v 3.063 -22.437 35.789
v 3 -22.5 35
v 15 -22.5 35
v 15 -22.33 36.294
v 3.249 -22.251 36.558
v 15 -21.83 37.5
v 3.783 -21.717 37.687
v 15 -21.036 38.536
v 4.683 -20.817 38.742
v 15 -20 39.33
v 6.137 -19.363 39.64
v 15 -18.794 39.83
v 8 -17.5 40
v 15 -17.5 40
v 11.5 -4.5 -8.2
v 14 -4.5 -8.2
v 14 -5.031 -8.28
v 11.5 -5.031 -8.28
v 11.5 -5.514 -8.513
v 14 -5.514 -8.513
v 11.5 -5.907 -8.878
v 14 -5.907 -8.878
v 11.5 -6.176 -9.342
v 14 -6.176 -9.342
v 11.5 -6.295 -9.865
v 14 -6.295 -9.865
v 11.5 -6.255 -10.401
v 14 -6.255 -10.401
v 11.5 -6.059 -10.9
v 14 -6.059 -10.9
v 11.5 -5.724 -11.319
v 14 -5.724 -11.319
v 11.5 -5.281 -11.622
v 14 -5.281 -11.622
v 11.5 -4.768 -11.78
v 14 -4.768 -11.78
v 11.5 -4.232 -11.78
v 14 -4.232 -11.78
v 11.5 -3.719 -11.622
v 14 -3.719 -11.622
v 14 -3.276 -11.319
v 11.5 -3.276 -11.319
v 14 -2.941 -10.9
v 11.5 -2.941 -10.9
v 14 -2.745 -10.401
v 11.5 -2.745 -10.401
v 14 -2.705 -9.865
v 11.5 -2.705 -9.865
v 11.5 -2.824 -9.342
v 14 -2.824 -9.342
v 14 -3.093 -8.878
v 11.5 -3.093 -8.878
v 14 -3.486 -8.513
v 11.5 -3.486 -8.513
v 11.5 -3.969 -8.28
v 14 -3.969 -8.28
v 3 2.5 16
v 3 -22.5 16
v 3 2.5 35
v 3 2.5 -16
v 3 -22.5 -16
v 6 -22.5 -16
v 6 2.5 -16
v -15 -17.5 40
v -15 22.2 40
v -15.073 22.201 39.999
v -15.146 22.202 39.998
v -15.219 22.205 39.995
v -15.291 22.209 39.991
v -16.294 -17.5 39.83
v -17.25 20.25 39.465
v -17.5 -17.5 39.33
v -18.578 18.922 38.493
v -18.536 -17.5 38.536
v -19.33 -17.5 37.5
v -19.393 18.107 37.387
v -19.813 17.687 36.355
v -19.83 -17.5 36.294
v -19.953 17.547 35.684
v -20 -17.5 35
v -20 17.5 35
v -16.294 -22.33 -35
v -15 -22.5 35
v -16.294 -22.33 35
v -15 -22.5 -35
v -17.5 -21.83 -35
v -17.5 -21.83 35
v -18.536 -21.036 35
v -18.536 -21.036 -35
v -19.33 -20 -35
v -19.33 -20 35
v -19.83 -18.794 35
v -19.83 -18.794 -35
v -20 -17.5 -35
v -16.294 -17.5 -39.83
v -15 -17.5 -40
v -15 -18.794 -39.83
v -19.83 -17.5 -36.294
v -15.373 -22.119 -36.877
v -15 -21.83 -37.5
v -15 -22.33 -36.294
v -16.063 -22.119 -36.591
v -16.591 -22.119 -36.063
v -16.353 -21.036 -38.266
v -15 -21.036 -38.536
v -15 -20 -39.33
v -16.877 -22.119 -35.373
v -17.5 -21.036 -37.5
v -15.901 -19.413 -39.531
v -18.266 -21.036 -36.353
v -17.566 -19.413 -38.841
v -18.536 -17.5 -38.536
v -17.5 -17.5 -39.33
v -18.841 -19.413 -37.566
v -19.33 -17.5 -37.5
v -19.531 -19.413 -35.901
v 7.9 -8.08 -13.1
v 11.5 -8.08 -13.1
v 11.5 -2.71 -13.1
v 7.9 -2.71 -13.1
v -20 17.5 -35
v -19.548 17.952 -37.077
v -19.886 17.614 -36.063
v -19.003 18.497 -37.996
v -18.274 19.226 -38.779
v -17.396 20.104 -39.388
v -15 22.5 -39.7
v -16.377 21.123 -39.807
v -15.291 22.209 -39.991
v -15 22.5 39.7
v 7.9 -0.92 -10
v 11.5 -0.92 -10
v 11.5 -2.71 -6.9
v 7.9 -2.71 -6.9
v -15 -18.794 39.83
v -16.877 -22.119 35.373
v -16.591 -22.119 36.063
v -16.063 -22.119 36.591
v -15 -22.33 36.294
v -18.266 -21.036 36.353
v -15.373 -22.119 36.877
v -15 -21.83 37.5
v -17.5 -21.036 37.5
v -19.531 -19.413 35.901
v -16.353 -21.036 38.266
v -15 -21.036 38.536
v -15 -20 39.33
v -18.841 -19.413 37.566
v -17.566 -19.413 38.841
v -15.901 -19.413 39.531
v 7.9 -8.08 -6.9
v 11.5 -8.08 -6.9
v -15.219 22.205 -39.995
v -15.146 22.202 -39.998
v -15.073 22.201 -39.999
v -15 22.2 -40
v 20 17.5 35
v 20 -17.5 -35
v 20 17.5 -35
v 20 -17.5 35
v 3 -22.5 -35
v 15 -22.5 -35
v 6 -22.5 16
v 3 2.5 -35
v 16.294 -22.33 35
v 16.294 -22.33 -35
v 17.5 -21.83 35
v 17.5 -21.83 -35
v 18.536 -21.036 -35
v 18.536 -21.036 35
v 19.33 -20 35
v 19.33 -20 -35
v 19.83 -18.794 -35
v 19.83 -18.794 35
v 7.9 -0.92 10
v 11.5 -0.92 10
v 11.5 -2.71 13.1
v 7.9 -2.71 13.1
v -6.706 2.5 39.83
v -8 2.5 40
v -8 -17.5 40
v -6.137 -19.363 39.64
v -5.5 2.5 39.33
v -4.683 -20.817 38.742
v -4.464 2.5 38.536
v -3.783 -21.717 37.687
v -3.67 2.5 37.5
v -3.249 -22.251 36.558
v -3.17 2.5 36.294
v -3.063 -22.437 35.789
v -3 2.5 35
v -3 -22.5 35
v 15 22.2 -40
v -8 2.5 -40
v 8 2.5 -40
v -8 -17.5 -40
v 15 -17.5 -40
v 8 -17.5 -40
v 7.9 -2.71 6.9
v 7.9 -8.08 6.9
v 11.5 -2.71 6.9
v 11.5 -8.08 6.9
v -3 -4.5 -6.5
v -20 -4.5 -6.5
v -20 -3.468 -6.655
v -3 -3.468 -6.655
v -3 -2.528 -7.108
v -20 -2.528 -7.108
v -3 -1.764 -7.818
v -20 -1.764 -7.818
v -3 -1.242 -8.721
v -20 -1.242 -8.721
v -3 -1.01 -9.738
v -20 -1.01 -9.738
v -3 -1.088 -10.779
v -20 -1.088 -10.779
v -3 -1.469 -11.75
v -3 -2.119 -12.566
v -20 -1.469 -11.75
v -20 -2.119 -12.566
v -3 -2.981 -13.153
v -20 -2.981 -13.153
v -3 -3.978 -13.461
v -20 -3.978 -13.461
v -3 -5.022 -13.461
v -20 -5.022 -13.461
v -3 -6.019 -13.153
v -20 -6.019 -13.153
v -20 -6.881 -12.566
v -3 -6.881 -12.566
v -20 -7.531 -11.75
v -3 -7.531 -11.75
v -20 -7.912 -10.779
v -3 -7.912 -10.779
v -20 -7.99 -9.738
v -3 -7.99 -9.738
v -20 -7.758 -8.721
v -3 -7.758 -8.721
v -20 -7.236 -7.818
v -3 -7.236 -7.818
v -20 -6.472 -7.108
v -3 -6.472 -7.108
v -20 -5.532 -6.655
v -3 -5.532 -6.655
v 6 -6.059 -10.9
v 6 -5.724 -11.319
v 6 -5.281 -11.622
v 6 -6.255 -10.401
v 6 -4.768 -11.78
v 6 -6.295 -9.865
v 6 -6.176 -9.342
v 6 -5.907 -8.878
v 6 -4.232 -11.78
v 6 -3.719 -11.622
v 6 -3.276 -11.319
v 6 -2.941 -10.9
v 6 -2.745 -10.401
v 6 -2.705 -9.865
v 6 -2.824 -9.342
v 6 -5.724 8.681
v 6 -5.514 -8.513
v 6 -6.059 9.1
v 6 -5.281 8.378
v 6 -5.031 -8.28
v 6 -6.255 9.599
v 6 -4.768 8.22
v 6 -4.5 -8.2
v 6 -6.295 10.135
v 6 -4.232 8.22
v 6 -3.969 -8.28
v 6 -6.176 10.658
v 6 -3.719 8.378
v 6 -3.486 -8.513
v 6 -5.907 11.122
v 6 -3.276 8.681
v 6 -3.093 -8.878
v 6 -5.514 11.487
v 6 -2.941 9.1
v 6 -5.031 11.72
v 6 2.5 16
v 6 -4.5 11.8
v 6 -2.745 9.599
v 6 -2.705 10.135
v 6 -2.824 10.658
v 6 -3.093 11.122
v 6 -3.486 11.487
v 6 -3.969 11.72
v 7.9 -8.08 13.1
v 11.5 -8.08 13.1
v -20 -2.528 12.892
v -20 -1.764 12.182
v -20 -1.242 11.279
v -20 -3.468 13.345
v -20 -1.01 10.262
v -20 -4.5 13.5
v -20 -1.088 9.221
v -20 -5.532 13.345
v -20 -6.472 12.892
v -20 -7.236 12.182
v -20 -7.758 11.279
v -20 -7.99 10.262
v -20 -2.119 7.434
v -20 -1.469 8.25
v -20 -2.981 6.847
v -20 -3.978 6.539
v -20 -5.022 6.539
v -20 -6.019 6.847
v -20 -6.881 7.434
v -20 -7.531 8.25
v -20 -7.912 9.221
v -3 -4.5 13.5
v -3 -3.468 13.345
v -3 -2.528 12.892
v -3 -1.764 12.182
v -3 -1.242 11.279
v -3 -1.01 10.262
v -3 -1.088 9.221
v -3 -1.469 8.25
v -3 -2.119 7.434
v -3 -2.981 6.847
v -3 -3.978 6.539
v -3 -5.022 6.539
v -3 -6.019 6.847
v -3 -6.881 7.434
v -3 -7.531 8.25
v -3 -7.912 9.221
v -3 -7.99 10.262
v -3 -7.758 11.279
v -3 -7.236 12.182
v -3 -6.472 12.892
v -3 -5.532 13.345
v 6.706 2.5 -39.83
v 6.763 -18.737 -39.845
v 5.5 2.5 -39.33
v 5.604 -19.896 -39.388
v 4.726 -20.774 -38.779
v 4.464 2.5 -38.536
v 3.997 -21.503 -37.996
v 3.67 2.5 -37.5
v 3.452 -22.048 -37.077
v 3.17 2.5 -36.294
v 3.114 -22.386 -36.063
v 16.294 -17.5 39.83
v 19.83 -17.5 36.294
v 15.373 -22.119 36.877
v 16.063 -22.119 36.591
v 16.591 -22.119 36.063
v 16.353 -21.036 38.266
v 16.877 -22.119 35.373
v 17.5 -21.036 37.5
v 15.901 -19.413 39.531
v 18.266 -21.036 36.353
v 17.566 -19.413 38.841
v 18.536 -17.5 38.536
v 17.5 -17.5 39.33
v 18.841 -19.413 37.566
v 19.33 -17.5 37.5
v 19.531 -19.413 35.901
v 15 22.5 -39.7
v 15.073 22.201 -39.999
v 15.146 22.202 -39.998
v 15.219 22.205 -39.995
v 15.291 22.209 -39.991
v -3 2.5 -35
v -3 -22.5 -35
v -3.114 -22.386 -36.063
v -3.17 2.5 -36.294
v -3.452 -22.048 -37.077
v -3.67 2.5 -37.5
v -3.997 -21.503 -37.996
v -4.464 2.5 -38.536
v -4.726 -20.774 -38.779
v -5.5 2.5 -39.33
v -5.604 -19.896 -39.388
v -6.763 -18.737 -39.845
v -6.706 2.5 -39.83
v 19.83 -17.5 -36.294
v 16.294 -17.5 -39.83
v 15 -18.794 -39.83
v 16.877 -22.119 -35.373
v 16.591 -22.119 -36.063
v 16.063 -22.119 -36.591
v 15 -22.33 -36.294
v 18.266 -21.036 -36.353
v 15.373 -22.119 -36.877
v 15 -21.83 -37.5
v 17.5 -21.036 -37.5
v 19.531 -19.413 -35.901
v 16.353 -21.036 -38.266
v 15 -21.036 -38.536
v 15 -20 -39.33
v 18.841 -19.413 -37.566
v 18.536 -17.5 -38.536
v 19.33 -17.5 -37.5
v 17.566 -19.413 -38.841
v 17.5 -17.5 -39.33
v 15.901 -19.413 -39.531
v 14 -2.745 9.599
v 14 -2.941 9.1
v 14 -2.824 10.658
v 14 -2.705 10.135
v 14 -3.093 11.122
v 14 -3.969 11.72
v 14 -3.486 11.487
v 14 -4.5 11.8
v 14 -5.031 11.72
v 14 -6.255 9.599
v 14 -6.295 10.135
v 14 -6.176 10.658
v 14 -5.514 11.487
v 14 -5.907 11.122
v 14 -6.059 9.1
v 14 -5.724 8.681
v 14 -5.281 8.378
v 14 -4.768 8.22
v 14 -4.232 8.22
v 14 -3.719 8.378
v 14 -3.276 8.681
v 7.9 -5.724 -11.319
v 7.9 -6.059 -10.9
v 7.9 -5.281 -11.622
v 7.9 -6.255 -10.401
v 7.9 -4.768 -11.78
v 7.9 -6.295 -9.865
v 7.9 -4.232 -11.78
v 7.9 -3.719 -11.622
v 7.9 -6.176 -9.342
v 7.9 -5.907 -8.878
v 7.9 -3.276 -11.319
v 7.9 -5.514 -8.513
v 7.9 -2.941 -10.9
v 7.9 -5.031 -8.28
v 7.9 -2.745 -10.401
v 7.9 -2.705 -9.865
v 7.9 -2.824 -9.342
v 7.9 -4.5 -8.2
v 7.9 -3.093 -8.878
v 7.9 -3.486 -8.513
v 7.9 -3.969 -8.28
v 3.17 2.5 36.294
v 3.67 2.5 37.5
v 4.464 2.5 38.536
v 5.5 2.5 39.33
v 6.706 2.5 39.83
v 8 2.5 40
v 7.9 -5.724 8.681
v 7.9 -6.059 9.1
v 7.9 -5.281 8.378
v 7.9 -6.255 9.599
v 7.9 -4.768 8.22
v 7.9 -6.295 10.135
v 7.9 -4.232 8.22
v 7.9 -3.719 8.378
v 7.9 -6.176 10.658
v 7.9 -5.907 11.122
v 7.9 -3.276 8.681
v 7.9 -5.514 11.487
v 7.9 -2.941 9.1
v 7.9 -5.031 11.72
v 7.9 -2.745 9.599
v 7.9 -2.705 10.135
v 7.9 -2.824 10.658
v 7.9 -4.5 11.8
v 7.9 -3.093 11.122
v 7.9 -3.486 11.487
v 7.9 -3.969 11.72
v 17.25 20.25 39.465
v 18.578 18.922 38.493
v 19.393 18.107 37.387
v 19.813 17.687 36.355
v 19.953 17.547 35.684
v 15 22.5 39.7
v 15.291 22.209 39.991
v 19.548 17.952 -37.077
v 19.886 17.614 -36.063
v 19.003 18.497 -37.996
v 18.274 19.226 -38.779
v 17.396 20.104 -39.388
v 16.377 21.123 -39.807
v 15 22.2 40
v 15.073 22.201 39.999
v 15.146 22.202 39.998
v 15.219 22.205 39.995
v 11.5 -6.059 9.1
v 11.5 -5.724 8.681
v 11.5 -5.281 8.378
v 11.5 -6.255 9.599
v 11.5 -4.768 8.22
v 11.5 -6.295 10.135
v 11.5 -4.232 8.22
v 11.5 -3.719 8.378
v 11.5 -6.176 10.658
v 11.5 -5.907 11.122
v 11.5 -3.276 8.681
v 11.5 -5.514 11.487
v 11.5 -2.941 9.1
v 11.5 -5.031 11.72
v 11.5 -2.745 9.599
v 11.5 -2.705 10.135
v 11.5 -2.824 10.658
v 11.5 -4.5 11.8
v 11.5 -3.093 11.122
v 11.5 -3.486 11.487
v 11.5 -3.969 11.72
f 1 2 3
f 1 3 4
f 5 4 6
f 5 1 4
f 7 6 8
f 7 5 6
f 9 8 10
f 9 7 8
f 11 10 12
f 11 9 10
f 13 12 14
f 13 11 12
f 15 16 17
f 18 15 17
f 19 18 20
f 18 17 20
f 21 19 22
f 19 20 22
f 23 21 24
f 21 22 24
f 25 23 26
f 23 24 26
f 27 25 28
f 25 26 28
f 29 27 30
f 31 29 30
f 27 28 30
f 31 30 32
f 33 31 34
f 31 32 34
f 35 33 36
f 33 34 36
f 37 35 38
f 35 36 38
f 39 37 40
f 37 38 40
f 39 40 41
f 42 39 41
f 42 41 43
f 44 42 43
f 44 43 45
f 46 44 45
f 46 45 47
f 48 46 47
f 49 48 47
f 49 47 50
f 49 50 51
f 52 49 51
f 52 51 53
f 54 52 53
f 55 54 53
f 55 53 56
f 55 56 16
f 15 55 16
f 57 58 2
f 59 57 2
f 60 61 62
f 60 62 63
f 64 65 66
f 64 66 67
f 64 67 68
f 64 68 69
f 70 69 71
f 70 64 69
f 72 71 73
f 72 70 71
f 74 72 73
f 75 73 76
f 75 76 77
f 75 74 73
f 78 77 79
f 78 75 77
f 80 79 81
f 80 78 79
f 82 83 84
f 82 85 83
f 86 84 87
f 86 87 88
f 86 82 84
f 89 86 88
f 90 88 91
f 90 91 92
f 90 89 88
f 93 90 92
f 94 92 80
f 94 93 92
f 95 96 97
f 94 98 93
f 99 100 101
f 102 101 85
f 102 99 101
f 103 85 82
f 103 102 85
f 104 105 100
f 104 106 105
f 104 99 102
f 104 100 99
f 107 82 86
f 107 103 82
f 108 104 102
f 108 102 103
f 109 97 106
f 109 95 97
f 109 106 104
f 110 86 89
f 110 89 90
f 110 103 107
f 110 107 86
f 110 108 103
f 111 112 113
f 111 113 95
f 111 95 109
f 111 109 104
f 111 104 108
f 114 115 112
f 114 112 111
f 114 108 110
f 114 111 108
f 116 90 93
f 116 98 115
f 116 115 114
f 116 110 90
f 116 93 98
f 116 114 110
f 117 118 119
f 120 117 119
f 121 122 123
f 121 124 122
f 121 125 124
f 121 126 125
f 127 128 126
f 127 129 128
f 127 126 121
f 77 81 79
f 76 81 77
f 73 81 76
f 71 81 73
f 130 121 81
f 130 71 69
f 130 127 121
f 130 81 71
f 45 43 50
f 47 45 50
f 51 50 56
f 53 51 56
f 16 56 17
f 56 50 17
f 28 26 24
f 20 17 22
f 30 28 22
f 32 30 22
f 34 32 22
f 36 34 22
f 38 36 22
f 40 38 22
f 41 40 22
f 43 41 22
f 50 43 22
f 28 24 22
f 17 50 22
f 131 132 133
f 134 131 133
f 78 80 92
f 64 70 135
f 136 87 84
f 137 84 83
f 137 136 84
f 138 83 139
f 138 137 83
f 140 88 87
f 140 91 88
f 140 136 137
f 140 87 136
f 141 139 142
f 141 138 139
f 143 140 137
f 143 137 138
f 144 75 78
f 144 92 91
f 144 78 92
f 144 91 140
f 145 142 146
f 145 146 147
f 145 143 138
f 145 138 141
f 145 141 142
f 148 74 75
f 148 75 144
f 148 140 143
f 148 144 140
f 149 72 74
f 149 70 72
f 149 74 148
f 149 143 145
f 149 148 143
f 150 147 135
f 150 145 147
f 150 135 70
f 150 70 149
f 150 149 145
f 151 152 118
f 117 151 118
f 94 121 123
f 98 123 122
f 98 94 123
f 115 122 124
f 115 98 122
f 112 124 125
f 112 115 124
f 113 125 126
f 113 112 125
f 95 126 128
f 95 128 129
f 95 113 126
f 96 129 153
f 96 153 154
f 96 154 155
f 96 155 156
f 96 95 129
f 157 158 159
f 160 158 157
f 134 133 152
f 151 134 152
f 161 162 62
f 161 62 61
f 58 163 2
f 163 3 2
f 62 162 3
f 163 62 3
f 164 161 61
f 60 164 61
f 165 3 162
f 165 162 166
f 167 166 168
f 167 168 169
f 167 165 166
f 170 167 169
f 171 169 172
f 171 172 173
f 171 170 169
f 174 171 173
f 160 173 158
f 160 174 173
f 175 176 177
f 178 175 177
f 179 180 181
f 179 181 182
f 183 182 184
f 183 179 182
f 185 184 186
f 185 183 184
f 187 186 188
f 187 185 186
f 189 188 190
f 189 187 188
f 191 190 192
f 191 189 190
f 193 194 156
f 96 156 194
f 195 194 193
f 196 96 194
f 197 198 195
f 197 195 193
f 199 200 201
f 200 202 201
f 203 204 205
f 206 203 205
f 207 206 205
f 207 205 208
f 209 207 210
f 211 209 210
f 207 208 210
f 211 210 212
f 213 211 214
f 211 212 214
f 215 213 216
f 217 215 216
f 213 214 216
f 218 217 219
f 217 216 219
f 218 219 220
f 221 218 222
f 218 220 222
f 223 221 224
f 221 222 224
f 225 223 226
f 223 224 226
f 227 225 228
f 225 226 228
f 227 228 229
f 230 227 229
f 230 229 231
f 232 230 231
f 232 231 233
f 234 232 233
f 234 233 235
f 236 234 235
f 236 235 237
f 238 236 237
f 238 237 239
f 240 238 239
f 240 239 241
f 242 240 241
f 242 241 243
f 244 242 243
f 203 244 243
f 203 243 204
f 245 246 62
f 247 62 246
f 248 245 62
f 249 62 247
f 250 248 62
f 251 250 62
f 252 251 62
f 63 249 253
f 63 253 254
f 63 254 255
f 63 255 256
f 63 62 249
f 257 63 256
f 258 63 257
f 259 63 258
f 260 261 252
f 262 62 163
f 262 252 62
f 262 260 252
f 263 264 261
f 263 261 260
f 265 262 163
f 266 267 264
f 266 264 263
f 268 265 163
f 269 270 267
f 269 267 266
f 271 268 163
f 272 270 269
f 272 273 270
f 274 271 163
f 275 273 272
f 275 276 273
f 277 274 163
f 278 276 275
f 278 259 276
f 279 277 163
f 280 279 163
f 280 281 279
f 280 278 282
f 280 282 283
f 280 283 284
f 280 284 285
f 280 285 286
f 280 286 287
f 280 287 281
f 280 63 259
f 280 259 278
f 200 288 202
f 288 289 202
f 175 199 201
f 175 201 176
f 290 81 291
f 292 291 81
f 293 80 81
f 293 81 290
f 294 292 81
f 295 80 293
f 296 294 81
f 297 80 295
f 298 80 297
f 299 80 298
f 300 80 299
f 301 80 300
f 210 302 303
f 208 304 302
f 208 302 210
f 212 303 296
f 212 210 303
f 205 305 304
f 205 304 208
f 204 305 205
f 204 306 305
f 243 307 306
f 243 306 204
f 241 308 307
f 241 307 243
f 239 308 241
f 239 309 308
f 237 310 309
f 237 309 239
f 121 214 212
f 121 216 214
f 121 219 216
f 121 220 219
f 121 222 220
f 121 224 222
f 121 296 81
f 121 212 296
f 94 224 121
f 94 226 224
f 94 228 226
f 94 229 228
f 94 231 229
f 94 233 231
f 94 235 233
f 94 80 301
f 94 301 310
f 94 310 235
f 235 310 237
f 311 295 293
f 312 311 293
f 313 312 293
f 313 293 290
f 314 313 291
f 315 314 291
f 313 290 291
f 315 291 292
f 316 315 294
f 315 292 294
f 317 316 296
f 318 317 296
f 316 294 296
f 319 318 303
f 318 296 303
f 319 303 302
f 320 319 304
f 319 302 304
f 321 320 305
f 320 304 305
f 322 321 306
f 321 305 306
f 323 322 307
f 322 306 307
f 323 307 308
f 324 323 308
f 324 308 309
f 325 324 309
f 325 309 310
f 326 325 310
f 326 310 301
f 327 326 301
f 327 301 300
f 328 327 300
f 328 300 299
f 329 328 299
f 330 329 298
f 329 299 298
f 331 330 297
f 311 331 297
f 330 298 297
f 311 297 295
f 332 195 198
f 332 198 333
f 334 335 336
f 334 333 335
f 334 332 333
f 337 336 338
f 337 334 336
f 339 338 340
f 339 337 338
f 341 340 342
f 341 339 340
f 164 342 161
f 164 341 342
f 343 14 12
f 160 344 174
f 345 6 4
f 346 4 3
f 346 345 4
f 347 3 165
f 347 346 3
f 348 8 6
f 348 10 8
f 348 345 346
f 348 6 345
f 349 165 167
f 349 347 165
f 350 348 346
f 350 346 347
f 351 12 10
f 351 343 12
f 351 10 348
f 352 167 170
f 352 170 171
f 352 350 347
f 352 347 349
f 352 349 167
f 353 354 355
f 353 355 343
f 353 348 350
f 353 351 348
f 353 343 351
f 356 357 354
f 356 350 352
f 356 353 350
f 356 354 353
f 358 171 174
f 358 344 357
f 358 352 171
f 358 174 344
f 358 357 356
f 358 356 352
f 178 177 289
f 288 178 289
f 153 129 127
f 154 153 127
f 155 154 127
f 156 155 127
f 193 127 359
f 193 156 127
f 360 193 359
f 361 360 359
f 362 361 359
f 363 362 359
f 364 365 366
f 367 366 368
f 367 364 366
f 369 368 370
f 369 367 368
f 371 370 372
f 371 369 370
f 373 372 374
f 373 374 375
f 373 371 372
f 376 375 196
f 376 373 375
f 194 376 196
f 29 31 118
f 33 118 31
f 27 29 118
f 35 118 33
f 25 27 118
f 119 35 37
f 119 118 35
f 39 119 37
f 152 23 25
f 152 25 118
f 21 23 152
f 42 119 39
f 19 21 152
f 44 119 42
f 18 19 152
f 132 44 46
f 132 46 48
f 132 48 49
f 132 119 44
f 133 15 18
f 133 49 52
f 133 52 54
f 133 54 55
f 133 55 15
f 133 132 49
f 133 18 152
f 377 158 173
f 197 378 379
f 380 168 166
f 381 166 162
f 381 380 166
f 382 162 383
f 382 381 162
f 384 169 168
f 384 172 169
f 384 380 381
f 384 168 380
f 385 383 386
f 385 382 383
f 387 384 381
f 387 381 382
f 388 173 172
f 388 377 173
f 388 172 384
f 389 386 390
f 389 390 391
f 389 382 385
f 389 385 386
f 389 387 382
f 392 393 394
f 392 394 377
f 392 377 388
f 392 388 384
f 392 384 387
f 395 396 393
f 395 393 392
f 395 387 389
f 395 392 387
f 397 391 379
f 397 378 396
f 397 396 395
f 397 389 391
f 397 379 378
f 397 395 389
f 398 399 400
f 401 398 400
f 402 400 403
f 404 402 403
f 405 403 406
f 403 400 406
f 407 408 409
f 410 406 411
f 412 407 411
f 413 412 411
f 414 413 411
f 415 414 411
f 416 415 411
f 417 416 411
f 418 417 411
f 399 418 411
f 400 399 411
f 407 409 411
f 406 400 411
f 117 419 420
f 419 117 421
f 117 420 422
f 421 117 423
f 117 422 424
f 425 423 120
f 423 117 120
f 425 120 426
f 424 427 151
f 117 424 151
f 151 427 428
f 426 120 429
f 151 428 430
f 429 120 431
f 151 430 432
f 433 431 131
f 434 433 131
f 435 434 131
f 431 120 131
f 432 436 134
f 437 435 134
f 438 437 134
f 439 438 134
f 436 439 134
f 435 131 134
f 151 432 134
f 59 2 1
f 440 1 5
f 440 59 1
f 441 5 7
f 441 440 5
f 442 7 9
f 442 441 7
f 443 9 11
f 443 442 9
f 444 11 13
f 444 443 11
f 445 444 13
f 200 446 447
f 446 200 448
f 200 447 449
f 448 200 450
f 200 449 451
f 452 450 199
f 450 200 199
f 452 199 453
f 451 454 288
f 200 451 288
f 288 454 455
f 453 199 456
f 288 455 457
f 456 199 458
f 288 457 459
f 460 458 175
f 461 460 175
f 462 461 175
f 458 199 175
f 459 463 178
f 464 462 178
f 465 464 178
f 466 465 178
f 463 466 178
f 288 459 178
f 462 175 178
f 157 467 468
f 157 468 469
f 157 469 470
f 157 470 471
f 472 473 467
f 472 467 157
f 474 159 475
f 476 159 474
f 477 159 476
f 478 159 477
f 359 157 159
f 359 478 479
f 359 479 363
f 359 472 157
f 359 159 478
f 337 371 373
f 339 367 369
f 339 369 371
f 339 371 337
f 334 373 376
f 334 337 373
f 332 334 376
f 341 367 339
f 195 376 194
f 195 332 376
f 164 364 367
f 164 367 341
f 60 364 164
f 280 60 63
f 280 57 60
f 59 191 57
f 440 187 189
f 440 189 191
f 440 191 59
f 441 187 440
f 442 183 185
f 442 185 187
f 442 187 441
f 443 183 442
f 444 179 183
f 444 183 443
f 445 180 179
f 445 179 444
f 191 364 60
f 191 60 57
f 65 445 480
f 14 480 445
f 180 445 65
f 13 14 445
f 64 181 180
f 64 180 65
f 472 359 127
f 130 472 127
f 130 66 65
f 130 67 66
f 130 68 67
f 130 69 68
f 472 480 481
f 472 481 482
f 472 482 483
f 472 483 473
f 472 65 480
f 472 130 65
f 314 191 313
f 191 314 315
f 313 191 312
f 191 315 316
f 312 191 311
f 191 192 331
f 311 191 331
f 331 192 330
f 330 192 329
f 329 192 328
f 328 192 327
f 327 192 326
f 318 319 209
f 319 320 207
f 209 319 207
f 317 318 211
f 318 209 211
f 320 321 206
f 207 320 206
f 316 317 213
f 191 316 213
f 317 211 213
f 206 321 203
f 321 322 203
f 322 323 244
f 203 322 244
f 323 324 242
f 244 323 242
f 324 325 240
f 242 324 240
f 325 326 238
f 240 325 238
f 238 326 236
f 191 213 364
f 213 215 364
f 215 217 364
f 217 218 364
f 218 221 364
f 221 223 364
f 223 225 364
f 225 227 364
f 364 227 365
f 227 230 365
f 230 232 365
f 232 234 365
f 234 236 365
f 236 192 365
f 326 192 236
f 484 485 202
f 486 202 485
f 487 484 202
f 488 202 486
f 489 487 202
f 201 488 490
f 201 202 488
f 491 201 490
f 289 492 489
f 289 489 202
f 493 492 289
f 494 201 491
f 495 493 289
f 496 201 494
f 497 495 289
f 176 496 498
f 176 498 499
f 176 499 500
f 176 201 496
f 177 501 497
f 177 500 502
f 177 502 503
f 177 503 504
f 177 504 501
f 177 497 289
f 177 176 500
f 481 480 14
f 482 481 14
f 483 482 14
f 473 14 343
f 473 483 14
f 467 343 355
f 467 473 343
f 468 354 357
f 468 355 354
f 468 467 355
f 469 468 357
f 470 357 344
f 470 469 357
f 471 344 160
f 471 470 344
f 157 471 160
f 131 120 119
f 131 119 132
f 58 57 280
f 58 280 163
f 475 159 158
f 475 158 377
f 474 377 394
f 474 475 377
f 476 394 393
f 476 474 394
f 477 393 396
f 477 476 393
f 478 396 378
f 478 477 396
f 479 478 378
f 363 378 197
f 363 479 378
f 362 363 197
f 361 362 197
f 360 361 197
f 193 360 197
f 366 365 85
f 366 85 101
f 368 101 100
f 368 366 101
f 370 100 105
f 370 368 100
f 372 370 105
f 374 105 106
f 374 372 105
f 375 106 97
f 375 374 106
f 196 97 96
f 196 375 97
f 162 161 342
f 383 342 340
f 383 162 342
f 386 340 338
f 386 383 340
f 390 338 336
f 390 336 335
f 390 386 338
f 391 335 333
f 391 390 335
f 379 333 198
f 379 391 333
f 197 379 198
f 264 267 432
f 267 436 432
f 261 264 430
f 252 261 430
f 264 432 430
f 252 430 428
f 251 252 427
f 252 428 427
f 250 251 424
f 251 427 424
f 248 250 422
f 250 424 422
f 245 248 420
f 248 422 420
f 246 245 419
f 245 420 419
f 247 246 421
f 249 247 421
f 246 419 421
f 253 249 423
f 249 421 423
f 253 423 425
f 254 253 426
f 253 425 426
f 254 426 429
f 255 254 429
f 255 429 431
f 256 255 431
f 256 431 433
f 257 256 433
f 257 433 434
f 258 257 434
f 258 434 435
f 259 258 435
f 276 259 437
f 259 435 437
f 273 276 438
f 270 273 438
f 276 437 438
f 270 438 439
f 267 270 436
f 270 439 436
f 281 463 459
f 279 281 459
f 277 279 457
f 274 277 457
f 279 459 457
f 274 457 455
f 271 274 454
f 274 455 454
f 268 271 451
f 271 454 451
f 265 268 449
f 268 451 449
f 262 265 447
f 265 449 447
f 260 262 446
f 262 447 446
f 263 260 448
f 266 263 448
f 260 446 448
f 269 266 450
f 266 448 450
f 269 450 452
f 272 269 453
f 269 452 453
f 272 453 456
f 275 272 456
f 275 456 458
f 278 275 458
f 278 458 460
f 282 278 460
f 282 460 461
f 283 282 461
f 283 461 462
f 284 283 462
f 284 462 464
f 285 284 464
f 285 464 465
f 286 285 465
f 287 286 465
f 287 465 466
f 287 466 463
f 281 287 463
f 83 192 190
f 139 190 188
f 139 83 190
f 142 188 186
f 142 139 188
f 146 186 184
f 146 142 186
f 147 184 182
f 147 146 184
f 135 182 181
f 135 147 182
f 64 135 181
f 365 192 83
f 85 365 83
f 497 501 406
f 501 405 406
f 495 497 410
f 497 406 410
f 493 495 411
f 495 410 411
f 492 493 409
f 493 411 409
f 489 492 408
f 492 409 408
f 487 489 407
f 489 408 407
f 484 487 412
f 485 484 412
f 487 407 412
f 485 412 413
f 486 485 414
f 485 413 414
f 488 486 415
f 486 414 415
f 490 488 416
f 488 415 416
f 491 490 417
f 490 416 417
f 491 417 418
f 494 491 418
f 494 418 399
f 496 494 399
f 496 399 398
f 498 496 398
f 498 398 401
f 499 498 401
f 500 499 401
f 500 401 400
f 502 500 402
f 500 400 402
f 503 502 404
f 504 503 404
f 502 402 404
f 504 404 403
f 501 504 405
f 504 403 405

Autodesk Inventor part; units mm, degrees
ref_plane "YZ Plane" through (0, 0, 0) normal (1, 0, 0) x (0, 1, 0)
ref_plane "XZ Plane" through (0, 0, 0) normal (0, 1, 0) x (-1, 0, 0)
sketch "Sketch1" plane through (0, 0, 0) normal (0, 1, 0) x (-1, 0, 0)
  line L0 (-20, 40) -> (20, 40)
  line L1 (20, 40) -> (20, -40)
  line L2 (20, -40) -> (-20, -40)
  line L3 (-20, -40) -> (-20, 40)
  line L4 (-20, 40) -> (20, -40) construction
  line L5 (20, 40) -> (-20, -40) construction
  point P0 (0, 0)
  dimension "d0" = 40
  dimension "d1" = 80
extrude "Extrusion1" add sketch "Sketch1" along normal mid plane 45
sketch "Sketch2" plane through (0, -22.5, 0) normal (0, -1, 0) x (1, 0, 0)
  line L0 (20, -40) -> (-20, -40) projected
  line L1 (3, 40) -> (-3, 40)
  line L2 (-3, 40) -> (-3, -40)
  line L3 (-3, -40) -> (3, -40)
  line L4 (3, -40) -> (3, 40)
  line L5 (3, 40) -> (-3, -40) construction
  line L6 (-3, 40) -> (3, -40) construction
  point P0 (0, 0)
  dimension "d4" = 6
extrude "Extrusion2" cut sketch "Sketch2" against normal blind 25
chamfer "Chamfer1" distance 5 angle 45 2 edges at (20, 22.5, 0) (-20, 22.5, 0)
chamfer "Chamfer2" distance 0.3 angle 45 2 edges at (0, 22.5, 40) (0, 22.5, -40)
fillet "Fillet1" radius 5 14 edges at (20, -2.5, 40) (-20, -2.5, 40) (20, -2.5, -40) (-20, -2.5, -40) (3, -10, -40) (-3, -10, -40) (-3, -10, 40) (3, -10, 40) (-20, -22.5, 0) (-11.5, -22.5, 40) (-11.5, -22.5, -40) (11.5, -22.5, -40) (20, -22.5, 0) (11.5, -22.5, 40)
sketch "Sketch5" plane through (3, -22.5, -35) normal (-1, 0, 0) x (0, 0, 1)
  line L0 (70, 0) -> (0, 0) projected
  line L1 (35, 0) -> (19, 0)
  line L2 (70, 25) -> (0, 25) projected
  line L3 (19, 0) -> (19, 25)
  line L4 (19, 25) -> (51, 25)
  line L5 (51, 25) -> (51, 0)
  line L6 (51, 0) -> (19, 0)
  point P0 (51, 0)
  dimension "d31" = 16
  dimension "d32" = 32
extrude "Extrusion4" cut sketch "Sketch5" against normal blind 3
sketch "Sketch6" plane through (6, -22.5, -35) normal (-1, 0, 0) x (0, 0, 1)
  line L0 (19, 25) -> (51, 25) projected
  line L1 (19, 0) -> (19, 25) projected
  line L2 (51, 0) -> (19, 0) projected
  line L3 (51, 25) -> (51, 0) projected
  line L4 (19, 25) -> (51, 25) projected
  line L5 (35, 25) -> (35, 18)
  line L6 (35, 18) -> (25, 18)
  point P0 (35, 22.5)
  point P1 (45, 18)
  dimension "d35" = 7
  dimension "d36" = 10
hole "Hole2" at (6, -4.5, -10) at (6, -4.5, 10) direction (1, 0, 0) diameter 3.6 depth 8 clearance for "Countersunk Flat Head Screw ISO 2009/7046" size "M3" standard "ISO"
ref_plane "Work Plane1" through (11.5, -22.5, 35) normal (-1, 0, 0) x (0, 0, 1)
sketch "Sketch7" plane through (11.5, -22.5, 35) normal (-1, 0, 0) x (0, 0, 1)
  line L0 (-25, 14.4204) -> (-28.1, 16.2102)
  line L1 (-28.1, 16.2102) -> (-28.1, 19.7898)
  line L2 (-28.1, 19.7898) -> (-25, 21.5796)
  line L3 (-25, 21.5796) -> (-21.9, 19.7898)
  line L4 (-21.9, 19.7898) -> (-21.9, 16.2102)
  line L5 (-21.9, 16.2102) -> (-25, 14.4204)
  line L6 (-45, 14.4204) -> (-48.1, 16.2102)
  line L7 (-48.1, 16.2102) -> (-48.1, 19.7898)
  line L8 (-48.1, 19.7898) -> (-45, 21.5796)
  line L9 (-45, 21.5796) -> (-41.9, 19.7898)
  line L10 (-41.9, 19.7898) -> (-41.9, 16.2102)
  line L11 (-41.9, 16.2102) -> (-45, 14.4204)
  line L12 (-21.9, 16.2102) -> (-21.9, 14.4204)
  line L13 (-21.9, 14.4204) -> (-28.1, 14.4204)
  line L14 (-28.1, 14.4204) -> (-28.1, 16.2102)
  line L15 (-41.9, 16.2102) -> (-41.9, 14.4204)
  line L16 (-41.9, 14.4204) -> (-48.1, 14.4204)
  line L17 (-48.1, 14.4204) -> (-48.1, 16.2102)
  point P0 (-35, 22.5)
  point P1 (-25, 18)
  point P2 (-45, 18)
  point P3 (-25, 18)
  point P4 (-45, 18)
  dimension "d52" = 6.2
  dimension "d53" = 6.2
extrude "Extrusion5" cut sketch "Sketch7" along normal blind 3.6
sketch "Sketch8" plane through (-20, -17.5, -35) normal (-1, 0, 0) x (0, 0, 1)
  circle A0 centre (25, 13) radius 1.8 projected
  circle A1 centre (45, 13) radius 1.8 projected
  line L0 (19, 20) -> (51, 20) projected
  line L1 (19, -5) -> (19, 20) projected
  line L2 (51, -5) -> (19, -5) projected
  line L3 (51, 20) -> (51, -5) projected
  circle A2 centre (25, 13) radius 3.5
  circle A3 centre (45, 13) radius 3.5
  point P0 (35, 17.5)
  dimension "d48" = 7
  dimension "d49" = 7
extrude "Extrusion6" cut sketch "Sketch8" against normal up to surface (23 mm away) contours A0 | A1 | A2 | A3
properties part number "SP45V1 Plastico Roldana" material "ABS Plastic"
